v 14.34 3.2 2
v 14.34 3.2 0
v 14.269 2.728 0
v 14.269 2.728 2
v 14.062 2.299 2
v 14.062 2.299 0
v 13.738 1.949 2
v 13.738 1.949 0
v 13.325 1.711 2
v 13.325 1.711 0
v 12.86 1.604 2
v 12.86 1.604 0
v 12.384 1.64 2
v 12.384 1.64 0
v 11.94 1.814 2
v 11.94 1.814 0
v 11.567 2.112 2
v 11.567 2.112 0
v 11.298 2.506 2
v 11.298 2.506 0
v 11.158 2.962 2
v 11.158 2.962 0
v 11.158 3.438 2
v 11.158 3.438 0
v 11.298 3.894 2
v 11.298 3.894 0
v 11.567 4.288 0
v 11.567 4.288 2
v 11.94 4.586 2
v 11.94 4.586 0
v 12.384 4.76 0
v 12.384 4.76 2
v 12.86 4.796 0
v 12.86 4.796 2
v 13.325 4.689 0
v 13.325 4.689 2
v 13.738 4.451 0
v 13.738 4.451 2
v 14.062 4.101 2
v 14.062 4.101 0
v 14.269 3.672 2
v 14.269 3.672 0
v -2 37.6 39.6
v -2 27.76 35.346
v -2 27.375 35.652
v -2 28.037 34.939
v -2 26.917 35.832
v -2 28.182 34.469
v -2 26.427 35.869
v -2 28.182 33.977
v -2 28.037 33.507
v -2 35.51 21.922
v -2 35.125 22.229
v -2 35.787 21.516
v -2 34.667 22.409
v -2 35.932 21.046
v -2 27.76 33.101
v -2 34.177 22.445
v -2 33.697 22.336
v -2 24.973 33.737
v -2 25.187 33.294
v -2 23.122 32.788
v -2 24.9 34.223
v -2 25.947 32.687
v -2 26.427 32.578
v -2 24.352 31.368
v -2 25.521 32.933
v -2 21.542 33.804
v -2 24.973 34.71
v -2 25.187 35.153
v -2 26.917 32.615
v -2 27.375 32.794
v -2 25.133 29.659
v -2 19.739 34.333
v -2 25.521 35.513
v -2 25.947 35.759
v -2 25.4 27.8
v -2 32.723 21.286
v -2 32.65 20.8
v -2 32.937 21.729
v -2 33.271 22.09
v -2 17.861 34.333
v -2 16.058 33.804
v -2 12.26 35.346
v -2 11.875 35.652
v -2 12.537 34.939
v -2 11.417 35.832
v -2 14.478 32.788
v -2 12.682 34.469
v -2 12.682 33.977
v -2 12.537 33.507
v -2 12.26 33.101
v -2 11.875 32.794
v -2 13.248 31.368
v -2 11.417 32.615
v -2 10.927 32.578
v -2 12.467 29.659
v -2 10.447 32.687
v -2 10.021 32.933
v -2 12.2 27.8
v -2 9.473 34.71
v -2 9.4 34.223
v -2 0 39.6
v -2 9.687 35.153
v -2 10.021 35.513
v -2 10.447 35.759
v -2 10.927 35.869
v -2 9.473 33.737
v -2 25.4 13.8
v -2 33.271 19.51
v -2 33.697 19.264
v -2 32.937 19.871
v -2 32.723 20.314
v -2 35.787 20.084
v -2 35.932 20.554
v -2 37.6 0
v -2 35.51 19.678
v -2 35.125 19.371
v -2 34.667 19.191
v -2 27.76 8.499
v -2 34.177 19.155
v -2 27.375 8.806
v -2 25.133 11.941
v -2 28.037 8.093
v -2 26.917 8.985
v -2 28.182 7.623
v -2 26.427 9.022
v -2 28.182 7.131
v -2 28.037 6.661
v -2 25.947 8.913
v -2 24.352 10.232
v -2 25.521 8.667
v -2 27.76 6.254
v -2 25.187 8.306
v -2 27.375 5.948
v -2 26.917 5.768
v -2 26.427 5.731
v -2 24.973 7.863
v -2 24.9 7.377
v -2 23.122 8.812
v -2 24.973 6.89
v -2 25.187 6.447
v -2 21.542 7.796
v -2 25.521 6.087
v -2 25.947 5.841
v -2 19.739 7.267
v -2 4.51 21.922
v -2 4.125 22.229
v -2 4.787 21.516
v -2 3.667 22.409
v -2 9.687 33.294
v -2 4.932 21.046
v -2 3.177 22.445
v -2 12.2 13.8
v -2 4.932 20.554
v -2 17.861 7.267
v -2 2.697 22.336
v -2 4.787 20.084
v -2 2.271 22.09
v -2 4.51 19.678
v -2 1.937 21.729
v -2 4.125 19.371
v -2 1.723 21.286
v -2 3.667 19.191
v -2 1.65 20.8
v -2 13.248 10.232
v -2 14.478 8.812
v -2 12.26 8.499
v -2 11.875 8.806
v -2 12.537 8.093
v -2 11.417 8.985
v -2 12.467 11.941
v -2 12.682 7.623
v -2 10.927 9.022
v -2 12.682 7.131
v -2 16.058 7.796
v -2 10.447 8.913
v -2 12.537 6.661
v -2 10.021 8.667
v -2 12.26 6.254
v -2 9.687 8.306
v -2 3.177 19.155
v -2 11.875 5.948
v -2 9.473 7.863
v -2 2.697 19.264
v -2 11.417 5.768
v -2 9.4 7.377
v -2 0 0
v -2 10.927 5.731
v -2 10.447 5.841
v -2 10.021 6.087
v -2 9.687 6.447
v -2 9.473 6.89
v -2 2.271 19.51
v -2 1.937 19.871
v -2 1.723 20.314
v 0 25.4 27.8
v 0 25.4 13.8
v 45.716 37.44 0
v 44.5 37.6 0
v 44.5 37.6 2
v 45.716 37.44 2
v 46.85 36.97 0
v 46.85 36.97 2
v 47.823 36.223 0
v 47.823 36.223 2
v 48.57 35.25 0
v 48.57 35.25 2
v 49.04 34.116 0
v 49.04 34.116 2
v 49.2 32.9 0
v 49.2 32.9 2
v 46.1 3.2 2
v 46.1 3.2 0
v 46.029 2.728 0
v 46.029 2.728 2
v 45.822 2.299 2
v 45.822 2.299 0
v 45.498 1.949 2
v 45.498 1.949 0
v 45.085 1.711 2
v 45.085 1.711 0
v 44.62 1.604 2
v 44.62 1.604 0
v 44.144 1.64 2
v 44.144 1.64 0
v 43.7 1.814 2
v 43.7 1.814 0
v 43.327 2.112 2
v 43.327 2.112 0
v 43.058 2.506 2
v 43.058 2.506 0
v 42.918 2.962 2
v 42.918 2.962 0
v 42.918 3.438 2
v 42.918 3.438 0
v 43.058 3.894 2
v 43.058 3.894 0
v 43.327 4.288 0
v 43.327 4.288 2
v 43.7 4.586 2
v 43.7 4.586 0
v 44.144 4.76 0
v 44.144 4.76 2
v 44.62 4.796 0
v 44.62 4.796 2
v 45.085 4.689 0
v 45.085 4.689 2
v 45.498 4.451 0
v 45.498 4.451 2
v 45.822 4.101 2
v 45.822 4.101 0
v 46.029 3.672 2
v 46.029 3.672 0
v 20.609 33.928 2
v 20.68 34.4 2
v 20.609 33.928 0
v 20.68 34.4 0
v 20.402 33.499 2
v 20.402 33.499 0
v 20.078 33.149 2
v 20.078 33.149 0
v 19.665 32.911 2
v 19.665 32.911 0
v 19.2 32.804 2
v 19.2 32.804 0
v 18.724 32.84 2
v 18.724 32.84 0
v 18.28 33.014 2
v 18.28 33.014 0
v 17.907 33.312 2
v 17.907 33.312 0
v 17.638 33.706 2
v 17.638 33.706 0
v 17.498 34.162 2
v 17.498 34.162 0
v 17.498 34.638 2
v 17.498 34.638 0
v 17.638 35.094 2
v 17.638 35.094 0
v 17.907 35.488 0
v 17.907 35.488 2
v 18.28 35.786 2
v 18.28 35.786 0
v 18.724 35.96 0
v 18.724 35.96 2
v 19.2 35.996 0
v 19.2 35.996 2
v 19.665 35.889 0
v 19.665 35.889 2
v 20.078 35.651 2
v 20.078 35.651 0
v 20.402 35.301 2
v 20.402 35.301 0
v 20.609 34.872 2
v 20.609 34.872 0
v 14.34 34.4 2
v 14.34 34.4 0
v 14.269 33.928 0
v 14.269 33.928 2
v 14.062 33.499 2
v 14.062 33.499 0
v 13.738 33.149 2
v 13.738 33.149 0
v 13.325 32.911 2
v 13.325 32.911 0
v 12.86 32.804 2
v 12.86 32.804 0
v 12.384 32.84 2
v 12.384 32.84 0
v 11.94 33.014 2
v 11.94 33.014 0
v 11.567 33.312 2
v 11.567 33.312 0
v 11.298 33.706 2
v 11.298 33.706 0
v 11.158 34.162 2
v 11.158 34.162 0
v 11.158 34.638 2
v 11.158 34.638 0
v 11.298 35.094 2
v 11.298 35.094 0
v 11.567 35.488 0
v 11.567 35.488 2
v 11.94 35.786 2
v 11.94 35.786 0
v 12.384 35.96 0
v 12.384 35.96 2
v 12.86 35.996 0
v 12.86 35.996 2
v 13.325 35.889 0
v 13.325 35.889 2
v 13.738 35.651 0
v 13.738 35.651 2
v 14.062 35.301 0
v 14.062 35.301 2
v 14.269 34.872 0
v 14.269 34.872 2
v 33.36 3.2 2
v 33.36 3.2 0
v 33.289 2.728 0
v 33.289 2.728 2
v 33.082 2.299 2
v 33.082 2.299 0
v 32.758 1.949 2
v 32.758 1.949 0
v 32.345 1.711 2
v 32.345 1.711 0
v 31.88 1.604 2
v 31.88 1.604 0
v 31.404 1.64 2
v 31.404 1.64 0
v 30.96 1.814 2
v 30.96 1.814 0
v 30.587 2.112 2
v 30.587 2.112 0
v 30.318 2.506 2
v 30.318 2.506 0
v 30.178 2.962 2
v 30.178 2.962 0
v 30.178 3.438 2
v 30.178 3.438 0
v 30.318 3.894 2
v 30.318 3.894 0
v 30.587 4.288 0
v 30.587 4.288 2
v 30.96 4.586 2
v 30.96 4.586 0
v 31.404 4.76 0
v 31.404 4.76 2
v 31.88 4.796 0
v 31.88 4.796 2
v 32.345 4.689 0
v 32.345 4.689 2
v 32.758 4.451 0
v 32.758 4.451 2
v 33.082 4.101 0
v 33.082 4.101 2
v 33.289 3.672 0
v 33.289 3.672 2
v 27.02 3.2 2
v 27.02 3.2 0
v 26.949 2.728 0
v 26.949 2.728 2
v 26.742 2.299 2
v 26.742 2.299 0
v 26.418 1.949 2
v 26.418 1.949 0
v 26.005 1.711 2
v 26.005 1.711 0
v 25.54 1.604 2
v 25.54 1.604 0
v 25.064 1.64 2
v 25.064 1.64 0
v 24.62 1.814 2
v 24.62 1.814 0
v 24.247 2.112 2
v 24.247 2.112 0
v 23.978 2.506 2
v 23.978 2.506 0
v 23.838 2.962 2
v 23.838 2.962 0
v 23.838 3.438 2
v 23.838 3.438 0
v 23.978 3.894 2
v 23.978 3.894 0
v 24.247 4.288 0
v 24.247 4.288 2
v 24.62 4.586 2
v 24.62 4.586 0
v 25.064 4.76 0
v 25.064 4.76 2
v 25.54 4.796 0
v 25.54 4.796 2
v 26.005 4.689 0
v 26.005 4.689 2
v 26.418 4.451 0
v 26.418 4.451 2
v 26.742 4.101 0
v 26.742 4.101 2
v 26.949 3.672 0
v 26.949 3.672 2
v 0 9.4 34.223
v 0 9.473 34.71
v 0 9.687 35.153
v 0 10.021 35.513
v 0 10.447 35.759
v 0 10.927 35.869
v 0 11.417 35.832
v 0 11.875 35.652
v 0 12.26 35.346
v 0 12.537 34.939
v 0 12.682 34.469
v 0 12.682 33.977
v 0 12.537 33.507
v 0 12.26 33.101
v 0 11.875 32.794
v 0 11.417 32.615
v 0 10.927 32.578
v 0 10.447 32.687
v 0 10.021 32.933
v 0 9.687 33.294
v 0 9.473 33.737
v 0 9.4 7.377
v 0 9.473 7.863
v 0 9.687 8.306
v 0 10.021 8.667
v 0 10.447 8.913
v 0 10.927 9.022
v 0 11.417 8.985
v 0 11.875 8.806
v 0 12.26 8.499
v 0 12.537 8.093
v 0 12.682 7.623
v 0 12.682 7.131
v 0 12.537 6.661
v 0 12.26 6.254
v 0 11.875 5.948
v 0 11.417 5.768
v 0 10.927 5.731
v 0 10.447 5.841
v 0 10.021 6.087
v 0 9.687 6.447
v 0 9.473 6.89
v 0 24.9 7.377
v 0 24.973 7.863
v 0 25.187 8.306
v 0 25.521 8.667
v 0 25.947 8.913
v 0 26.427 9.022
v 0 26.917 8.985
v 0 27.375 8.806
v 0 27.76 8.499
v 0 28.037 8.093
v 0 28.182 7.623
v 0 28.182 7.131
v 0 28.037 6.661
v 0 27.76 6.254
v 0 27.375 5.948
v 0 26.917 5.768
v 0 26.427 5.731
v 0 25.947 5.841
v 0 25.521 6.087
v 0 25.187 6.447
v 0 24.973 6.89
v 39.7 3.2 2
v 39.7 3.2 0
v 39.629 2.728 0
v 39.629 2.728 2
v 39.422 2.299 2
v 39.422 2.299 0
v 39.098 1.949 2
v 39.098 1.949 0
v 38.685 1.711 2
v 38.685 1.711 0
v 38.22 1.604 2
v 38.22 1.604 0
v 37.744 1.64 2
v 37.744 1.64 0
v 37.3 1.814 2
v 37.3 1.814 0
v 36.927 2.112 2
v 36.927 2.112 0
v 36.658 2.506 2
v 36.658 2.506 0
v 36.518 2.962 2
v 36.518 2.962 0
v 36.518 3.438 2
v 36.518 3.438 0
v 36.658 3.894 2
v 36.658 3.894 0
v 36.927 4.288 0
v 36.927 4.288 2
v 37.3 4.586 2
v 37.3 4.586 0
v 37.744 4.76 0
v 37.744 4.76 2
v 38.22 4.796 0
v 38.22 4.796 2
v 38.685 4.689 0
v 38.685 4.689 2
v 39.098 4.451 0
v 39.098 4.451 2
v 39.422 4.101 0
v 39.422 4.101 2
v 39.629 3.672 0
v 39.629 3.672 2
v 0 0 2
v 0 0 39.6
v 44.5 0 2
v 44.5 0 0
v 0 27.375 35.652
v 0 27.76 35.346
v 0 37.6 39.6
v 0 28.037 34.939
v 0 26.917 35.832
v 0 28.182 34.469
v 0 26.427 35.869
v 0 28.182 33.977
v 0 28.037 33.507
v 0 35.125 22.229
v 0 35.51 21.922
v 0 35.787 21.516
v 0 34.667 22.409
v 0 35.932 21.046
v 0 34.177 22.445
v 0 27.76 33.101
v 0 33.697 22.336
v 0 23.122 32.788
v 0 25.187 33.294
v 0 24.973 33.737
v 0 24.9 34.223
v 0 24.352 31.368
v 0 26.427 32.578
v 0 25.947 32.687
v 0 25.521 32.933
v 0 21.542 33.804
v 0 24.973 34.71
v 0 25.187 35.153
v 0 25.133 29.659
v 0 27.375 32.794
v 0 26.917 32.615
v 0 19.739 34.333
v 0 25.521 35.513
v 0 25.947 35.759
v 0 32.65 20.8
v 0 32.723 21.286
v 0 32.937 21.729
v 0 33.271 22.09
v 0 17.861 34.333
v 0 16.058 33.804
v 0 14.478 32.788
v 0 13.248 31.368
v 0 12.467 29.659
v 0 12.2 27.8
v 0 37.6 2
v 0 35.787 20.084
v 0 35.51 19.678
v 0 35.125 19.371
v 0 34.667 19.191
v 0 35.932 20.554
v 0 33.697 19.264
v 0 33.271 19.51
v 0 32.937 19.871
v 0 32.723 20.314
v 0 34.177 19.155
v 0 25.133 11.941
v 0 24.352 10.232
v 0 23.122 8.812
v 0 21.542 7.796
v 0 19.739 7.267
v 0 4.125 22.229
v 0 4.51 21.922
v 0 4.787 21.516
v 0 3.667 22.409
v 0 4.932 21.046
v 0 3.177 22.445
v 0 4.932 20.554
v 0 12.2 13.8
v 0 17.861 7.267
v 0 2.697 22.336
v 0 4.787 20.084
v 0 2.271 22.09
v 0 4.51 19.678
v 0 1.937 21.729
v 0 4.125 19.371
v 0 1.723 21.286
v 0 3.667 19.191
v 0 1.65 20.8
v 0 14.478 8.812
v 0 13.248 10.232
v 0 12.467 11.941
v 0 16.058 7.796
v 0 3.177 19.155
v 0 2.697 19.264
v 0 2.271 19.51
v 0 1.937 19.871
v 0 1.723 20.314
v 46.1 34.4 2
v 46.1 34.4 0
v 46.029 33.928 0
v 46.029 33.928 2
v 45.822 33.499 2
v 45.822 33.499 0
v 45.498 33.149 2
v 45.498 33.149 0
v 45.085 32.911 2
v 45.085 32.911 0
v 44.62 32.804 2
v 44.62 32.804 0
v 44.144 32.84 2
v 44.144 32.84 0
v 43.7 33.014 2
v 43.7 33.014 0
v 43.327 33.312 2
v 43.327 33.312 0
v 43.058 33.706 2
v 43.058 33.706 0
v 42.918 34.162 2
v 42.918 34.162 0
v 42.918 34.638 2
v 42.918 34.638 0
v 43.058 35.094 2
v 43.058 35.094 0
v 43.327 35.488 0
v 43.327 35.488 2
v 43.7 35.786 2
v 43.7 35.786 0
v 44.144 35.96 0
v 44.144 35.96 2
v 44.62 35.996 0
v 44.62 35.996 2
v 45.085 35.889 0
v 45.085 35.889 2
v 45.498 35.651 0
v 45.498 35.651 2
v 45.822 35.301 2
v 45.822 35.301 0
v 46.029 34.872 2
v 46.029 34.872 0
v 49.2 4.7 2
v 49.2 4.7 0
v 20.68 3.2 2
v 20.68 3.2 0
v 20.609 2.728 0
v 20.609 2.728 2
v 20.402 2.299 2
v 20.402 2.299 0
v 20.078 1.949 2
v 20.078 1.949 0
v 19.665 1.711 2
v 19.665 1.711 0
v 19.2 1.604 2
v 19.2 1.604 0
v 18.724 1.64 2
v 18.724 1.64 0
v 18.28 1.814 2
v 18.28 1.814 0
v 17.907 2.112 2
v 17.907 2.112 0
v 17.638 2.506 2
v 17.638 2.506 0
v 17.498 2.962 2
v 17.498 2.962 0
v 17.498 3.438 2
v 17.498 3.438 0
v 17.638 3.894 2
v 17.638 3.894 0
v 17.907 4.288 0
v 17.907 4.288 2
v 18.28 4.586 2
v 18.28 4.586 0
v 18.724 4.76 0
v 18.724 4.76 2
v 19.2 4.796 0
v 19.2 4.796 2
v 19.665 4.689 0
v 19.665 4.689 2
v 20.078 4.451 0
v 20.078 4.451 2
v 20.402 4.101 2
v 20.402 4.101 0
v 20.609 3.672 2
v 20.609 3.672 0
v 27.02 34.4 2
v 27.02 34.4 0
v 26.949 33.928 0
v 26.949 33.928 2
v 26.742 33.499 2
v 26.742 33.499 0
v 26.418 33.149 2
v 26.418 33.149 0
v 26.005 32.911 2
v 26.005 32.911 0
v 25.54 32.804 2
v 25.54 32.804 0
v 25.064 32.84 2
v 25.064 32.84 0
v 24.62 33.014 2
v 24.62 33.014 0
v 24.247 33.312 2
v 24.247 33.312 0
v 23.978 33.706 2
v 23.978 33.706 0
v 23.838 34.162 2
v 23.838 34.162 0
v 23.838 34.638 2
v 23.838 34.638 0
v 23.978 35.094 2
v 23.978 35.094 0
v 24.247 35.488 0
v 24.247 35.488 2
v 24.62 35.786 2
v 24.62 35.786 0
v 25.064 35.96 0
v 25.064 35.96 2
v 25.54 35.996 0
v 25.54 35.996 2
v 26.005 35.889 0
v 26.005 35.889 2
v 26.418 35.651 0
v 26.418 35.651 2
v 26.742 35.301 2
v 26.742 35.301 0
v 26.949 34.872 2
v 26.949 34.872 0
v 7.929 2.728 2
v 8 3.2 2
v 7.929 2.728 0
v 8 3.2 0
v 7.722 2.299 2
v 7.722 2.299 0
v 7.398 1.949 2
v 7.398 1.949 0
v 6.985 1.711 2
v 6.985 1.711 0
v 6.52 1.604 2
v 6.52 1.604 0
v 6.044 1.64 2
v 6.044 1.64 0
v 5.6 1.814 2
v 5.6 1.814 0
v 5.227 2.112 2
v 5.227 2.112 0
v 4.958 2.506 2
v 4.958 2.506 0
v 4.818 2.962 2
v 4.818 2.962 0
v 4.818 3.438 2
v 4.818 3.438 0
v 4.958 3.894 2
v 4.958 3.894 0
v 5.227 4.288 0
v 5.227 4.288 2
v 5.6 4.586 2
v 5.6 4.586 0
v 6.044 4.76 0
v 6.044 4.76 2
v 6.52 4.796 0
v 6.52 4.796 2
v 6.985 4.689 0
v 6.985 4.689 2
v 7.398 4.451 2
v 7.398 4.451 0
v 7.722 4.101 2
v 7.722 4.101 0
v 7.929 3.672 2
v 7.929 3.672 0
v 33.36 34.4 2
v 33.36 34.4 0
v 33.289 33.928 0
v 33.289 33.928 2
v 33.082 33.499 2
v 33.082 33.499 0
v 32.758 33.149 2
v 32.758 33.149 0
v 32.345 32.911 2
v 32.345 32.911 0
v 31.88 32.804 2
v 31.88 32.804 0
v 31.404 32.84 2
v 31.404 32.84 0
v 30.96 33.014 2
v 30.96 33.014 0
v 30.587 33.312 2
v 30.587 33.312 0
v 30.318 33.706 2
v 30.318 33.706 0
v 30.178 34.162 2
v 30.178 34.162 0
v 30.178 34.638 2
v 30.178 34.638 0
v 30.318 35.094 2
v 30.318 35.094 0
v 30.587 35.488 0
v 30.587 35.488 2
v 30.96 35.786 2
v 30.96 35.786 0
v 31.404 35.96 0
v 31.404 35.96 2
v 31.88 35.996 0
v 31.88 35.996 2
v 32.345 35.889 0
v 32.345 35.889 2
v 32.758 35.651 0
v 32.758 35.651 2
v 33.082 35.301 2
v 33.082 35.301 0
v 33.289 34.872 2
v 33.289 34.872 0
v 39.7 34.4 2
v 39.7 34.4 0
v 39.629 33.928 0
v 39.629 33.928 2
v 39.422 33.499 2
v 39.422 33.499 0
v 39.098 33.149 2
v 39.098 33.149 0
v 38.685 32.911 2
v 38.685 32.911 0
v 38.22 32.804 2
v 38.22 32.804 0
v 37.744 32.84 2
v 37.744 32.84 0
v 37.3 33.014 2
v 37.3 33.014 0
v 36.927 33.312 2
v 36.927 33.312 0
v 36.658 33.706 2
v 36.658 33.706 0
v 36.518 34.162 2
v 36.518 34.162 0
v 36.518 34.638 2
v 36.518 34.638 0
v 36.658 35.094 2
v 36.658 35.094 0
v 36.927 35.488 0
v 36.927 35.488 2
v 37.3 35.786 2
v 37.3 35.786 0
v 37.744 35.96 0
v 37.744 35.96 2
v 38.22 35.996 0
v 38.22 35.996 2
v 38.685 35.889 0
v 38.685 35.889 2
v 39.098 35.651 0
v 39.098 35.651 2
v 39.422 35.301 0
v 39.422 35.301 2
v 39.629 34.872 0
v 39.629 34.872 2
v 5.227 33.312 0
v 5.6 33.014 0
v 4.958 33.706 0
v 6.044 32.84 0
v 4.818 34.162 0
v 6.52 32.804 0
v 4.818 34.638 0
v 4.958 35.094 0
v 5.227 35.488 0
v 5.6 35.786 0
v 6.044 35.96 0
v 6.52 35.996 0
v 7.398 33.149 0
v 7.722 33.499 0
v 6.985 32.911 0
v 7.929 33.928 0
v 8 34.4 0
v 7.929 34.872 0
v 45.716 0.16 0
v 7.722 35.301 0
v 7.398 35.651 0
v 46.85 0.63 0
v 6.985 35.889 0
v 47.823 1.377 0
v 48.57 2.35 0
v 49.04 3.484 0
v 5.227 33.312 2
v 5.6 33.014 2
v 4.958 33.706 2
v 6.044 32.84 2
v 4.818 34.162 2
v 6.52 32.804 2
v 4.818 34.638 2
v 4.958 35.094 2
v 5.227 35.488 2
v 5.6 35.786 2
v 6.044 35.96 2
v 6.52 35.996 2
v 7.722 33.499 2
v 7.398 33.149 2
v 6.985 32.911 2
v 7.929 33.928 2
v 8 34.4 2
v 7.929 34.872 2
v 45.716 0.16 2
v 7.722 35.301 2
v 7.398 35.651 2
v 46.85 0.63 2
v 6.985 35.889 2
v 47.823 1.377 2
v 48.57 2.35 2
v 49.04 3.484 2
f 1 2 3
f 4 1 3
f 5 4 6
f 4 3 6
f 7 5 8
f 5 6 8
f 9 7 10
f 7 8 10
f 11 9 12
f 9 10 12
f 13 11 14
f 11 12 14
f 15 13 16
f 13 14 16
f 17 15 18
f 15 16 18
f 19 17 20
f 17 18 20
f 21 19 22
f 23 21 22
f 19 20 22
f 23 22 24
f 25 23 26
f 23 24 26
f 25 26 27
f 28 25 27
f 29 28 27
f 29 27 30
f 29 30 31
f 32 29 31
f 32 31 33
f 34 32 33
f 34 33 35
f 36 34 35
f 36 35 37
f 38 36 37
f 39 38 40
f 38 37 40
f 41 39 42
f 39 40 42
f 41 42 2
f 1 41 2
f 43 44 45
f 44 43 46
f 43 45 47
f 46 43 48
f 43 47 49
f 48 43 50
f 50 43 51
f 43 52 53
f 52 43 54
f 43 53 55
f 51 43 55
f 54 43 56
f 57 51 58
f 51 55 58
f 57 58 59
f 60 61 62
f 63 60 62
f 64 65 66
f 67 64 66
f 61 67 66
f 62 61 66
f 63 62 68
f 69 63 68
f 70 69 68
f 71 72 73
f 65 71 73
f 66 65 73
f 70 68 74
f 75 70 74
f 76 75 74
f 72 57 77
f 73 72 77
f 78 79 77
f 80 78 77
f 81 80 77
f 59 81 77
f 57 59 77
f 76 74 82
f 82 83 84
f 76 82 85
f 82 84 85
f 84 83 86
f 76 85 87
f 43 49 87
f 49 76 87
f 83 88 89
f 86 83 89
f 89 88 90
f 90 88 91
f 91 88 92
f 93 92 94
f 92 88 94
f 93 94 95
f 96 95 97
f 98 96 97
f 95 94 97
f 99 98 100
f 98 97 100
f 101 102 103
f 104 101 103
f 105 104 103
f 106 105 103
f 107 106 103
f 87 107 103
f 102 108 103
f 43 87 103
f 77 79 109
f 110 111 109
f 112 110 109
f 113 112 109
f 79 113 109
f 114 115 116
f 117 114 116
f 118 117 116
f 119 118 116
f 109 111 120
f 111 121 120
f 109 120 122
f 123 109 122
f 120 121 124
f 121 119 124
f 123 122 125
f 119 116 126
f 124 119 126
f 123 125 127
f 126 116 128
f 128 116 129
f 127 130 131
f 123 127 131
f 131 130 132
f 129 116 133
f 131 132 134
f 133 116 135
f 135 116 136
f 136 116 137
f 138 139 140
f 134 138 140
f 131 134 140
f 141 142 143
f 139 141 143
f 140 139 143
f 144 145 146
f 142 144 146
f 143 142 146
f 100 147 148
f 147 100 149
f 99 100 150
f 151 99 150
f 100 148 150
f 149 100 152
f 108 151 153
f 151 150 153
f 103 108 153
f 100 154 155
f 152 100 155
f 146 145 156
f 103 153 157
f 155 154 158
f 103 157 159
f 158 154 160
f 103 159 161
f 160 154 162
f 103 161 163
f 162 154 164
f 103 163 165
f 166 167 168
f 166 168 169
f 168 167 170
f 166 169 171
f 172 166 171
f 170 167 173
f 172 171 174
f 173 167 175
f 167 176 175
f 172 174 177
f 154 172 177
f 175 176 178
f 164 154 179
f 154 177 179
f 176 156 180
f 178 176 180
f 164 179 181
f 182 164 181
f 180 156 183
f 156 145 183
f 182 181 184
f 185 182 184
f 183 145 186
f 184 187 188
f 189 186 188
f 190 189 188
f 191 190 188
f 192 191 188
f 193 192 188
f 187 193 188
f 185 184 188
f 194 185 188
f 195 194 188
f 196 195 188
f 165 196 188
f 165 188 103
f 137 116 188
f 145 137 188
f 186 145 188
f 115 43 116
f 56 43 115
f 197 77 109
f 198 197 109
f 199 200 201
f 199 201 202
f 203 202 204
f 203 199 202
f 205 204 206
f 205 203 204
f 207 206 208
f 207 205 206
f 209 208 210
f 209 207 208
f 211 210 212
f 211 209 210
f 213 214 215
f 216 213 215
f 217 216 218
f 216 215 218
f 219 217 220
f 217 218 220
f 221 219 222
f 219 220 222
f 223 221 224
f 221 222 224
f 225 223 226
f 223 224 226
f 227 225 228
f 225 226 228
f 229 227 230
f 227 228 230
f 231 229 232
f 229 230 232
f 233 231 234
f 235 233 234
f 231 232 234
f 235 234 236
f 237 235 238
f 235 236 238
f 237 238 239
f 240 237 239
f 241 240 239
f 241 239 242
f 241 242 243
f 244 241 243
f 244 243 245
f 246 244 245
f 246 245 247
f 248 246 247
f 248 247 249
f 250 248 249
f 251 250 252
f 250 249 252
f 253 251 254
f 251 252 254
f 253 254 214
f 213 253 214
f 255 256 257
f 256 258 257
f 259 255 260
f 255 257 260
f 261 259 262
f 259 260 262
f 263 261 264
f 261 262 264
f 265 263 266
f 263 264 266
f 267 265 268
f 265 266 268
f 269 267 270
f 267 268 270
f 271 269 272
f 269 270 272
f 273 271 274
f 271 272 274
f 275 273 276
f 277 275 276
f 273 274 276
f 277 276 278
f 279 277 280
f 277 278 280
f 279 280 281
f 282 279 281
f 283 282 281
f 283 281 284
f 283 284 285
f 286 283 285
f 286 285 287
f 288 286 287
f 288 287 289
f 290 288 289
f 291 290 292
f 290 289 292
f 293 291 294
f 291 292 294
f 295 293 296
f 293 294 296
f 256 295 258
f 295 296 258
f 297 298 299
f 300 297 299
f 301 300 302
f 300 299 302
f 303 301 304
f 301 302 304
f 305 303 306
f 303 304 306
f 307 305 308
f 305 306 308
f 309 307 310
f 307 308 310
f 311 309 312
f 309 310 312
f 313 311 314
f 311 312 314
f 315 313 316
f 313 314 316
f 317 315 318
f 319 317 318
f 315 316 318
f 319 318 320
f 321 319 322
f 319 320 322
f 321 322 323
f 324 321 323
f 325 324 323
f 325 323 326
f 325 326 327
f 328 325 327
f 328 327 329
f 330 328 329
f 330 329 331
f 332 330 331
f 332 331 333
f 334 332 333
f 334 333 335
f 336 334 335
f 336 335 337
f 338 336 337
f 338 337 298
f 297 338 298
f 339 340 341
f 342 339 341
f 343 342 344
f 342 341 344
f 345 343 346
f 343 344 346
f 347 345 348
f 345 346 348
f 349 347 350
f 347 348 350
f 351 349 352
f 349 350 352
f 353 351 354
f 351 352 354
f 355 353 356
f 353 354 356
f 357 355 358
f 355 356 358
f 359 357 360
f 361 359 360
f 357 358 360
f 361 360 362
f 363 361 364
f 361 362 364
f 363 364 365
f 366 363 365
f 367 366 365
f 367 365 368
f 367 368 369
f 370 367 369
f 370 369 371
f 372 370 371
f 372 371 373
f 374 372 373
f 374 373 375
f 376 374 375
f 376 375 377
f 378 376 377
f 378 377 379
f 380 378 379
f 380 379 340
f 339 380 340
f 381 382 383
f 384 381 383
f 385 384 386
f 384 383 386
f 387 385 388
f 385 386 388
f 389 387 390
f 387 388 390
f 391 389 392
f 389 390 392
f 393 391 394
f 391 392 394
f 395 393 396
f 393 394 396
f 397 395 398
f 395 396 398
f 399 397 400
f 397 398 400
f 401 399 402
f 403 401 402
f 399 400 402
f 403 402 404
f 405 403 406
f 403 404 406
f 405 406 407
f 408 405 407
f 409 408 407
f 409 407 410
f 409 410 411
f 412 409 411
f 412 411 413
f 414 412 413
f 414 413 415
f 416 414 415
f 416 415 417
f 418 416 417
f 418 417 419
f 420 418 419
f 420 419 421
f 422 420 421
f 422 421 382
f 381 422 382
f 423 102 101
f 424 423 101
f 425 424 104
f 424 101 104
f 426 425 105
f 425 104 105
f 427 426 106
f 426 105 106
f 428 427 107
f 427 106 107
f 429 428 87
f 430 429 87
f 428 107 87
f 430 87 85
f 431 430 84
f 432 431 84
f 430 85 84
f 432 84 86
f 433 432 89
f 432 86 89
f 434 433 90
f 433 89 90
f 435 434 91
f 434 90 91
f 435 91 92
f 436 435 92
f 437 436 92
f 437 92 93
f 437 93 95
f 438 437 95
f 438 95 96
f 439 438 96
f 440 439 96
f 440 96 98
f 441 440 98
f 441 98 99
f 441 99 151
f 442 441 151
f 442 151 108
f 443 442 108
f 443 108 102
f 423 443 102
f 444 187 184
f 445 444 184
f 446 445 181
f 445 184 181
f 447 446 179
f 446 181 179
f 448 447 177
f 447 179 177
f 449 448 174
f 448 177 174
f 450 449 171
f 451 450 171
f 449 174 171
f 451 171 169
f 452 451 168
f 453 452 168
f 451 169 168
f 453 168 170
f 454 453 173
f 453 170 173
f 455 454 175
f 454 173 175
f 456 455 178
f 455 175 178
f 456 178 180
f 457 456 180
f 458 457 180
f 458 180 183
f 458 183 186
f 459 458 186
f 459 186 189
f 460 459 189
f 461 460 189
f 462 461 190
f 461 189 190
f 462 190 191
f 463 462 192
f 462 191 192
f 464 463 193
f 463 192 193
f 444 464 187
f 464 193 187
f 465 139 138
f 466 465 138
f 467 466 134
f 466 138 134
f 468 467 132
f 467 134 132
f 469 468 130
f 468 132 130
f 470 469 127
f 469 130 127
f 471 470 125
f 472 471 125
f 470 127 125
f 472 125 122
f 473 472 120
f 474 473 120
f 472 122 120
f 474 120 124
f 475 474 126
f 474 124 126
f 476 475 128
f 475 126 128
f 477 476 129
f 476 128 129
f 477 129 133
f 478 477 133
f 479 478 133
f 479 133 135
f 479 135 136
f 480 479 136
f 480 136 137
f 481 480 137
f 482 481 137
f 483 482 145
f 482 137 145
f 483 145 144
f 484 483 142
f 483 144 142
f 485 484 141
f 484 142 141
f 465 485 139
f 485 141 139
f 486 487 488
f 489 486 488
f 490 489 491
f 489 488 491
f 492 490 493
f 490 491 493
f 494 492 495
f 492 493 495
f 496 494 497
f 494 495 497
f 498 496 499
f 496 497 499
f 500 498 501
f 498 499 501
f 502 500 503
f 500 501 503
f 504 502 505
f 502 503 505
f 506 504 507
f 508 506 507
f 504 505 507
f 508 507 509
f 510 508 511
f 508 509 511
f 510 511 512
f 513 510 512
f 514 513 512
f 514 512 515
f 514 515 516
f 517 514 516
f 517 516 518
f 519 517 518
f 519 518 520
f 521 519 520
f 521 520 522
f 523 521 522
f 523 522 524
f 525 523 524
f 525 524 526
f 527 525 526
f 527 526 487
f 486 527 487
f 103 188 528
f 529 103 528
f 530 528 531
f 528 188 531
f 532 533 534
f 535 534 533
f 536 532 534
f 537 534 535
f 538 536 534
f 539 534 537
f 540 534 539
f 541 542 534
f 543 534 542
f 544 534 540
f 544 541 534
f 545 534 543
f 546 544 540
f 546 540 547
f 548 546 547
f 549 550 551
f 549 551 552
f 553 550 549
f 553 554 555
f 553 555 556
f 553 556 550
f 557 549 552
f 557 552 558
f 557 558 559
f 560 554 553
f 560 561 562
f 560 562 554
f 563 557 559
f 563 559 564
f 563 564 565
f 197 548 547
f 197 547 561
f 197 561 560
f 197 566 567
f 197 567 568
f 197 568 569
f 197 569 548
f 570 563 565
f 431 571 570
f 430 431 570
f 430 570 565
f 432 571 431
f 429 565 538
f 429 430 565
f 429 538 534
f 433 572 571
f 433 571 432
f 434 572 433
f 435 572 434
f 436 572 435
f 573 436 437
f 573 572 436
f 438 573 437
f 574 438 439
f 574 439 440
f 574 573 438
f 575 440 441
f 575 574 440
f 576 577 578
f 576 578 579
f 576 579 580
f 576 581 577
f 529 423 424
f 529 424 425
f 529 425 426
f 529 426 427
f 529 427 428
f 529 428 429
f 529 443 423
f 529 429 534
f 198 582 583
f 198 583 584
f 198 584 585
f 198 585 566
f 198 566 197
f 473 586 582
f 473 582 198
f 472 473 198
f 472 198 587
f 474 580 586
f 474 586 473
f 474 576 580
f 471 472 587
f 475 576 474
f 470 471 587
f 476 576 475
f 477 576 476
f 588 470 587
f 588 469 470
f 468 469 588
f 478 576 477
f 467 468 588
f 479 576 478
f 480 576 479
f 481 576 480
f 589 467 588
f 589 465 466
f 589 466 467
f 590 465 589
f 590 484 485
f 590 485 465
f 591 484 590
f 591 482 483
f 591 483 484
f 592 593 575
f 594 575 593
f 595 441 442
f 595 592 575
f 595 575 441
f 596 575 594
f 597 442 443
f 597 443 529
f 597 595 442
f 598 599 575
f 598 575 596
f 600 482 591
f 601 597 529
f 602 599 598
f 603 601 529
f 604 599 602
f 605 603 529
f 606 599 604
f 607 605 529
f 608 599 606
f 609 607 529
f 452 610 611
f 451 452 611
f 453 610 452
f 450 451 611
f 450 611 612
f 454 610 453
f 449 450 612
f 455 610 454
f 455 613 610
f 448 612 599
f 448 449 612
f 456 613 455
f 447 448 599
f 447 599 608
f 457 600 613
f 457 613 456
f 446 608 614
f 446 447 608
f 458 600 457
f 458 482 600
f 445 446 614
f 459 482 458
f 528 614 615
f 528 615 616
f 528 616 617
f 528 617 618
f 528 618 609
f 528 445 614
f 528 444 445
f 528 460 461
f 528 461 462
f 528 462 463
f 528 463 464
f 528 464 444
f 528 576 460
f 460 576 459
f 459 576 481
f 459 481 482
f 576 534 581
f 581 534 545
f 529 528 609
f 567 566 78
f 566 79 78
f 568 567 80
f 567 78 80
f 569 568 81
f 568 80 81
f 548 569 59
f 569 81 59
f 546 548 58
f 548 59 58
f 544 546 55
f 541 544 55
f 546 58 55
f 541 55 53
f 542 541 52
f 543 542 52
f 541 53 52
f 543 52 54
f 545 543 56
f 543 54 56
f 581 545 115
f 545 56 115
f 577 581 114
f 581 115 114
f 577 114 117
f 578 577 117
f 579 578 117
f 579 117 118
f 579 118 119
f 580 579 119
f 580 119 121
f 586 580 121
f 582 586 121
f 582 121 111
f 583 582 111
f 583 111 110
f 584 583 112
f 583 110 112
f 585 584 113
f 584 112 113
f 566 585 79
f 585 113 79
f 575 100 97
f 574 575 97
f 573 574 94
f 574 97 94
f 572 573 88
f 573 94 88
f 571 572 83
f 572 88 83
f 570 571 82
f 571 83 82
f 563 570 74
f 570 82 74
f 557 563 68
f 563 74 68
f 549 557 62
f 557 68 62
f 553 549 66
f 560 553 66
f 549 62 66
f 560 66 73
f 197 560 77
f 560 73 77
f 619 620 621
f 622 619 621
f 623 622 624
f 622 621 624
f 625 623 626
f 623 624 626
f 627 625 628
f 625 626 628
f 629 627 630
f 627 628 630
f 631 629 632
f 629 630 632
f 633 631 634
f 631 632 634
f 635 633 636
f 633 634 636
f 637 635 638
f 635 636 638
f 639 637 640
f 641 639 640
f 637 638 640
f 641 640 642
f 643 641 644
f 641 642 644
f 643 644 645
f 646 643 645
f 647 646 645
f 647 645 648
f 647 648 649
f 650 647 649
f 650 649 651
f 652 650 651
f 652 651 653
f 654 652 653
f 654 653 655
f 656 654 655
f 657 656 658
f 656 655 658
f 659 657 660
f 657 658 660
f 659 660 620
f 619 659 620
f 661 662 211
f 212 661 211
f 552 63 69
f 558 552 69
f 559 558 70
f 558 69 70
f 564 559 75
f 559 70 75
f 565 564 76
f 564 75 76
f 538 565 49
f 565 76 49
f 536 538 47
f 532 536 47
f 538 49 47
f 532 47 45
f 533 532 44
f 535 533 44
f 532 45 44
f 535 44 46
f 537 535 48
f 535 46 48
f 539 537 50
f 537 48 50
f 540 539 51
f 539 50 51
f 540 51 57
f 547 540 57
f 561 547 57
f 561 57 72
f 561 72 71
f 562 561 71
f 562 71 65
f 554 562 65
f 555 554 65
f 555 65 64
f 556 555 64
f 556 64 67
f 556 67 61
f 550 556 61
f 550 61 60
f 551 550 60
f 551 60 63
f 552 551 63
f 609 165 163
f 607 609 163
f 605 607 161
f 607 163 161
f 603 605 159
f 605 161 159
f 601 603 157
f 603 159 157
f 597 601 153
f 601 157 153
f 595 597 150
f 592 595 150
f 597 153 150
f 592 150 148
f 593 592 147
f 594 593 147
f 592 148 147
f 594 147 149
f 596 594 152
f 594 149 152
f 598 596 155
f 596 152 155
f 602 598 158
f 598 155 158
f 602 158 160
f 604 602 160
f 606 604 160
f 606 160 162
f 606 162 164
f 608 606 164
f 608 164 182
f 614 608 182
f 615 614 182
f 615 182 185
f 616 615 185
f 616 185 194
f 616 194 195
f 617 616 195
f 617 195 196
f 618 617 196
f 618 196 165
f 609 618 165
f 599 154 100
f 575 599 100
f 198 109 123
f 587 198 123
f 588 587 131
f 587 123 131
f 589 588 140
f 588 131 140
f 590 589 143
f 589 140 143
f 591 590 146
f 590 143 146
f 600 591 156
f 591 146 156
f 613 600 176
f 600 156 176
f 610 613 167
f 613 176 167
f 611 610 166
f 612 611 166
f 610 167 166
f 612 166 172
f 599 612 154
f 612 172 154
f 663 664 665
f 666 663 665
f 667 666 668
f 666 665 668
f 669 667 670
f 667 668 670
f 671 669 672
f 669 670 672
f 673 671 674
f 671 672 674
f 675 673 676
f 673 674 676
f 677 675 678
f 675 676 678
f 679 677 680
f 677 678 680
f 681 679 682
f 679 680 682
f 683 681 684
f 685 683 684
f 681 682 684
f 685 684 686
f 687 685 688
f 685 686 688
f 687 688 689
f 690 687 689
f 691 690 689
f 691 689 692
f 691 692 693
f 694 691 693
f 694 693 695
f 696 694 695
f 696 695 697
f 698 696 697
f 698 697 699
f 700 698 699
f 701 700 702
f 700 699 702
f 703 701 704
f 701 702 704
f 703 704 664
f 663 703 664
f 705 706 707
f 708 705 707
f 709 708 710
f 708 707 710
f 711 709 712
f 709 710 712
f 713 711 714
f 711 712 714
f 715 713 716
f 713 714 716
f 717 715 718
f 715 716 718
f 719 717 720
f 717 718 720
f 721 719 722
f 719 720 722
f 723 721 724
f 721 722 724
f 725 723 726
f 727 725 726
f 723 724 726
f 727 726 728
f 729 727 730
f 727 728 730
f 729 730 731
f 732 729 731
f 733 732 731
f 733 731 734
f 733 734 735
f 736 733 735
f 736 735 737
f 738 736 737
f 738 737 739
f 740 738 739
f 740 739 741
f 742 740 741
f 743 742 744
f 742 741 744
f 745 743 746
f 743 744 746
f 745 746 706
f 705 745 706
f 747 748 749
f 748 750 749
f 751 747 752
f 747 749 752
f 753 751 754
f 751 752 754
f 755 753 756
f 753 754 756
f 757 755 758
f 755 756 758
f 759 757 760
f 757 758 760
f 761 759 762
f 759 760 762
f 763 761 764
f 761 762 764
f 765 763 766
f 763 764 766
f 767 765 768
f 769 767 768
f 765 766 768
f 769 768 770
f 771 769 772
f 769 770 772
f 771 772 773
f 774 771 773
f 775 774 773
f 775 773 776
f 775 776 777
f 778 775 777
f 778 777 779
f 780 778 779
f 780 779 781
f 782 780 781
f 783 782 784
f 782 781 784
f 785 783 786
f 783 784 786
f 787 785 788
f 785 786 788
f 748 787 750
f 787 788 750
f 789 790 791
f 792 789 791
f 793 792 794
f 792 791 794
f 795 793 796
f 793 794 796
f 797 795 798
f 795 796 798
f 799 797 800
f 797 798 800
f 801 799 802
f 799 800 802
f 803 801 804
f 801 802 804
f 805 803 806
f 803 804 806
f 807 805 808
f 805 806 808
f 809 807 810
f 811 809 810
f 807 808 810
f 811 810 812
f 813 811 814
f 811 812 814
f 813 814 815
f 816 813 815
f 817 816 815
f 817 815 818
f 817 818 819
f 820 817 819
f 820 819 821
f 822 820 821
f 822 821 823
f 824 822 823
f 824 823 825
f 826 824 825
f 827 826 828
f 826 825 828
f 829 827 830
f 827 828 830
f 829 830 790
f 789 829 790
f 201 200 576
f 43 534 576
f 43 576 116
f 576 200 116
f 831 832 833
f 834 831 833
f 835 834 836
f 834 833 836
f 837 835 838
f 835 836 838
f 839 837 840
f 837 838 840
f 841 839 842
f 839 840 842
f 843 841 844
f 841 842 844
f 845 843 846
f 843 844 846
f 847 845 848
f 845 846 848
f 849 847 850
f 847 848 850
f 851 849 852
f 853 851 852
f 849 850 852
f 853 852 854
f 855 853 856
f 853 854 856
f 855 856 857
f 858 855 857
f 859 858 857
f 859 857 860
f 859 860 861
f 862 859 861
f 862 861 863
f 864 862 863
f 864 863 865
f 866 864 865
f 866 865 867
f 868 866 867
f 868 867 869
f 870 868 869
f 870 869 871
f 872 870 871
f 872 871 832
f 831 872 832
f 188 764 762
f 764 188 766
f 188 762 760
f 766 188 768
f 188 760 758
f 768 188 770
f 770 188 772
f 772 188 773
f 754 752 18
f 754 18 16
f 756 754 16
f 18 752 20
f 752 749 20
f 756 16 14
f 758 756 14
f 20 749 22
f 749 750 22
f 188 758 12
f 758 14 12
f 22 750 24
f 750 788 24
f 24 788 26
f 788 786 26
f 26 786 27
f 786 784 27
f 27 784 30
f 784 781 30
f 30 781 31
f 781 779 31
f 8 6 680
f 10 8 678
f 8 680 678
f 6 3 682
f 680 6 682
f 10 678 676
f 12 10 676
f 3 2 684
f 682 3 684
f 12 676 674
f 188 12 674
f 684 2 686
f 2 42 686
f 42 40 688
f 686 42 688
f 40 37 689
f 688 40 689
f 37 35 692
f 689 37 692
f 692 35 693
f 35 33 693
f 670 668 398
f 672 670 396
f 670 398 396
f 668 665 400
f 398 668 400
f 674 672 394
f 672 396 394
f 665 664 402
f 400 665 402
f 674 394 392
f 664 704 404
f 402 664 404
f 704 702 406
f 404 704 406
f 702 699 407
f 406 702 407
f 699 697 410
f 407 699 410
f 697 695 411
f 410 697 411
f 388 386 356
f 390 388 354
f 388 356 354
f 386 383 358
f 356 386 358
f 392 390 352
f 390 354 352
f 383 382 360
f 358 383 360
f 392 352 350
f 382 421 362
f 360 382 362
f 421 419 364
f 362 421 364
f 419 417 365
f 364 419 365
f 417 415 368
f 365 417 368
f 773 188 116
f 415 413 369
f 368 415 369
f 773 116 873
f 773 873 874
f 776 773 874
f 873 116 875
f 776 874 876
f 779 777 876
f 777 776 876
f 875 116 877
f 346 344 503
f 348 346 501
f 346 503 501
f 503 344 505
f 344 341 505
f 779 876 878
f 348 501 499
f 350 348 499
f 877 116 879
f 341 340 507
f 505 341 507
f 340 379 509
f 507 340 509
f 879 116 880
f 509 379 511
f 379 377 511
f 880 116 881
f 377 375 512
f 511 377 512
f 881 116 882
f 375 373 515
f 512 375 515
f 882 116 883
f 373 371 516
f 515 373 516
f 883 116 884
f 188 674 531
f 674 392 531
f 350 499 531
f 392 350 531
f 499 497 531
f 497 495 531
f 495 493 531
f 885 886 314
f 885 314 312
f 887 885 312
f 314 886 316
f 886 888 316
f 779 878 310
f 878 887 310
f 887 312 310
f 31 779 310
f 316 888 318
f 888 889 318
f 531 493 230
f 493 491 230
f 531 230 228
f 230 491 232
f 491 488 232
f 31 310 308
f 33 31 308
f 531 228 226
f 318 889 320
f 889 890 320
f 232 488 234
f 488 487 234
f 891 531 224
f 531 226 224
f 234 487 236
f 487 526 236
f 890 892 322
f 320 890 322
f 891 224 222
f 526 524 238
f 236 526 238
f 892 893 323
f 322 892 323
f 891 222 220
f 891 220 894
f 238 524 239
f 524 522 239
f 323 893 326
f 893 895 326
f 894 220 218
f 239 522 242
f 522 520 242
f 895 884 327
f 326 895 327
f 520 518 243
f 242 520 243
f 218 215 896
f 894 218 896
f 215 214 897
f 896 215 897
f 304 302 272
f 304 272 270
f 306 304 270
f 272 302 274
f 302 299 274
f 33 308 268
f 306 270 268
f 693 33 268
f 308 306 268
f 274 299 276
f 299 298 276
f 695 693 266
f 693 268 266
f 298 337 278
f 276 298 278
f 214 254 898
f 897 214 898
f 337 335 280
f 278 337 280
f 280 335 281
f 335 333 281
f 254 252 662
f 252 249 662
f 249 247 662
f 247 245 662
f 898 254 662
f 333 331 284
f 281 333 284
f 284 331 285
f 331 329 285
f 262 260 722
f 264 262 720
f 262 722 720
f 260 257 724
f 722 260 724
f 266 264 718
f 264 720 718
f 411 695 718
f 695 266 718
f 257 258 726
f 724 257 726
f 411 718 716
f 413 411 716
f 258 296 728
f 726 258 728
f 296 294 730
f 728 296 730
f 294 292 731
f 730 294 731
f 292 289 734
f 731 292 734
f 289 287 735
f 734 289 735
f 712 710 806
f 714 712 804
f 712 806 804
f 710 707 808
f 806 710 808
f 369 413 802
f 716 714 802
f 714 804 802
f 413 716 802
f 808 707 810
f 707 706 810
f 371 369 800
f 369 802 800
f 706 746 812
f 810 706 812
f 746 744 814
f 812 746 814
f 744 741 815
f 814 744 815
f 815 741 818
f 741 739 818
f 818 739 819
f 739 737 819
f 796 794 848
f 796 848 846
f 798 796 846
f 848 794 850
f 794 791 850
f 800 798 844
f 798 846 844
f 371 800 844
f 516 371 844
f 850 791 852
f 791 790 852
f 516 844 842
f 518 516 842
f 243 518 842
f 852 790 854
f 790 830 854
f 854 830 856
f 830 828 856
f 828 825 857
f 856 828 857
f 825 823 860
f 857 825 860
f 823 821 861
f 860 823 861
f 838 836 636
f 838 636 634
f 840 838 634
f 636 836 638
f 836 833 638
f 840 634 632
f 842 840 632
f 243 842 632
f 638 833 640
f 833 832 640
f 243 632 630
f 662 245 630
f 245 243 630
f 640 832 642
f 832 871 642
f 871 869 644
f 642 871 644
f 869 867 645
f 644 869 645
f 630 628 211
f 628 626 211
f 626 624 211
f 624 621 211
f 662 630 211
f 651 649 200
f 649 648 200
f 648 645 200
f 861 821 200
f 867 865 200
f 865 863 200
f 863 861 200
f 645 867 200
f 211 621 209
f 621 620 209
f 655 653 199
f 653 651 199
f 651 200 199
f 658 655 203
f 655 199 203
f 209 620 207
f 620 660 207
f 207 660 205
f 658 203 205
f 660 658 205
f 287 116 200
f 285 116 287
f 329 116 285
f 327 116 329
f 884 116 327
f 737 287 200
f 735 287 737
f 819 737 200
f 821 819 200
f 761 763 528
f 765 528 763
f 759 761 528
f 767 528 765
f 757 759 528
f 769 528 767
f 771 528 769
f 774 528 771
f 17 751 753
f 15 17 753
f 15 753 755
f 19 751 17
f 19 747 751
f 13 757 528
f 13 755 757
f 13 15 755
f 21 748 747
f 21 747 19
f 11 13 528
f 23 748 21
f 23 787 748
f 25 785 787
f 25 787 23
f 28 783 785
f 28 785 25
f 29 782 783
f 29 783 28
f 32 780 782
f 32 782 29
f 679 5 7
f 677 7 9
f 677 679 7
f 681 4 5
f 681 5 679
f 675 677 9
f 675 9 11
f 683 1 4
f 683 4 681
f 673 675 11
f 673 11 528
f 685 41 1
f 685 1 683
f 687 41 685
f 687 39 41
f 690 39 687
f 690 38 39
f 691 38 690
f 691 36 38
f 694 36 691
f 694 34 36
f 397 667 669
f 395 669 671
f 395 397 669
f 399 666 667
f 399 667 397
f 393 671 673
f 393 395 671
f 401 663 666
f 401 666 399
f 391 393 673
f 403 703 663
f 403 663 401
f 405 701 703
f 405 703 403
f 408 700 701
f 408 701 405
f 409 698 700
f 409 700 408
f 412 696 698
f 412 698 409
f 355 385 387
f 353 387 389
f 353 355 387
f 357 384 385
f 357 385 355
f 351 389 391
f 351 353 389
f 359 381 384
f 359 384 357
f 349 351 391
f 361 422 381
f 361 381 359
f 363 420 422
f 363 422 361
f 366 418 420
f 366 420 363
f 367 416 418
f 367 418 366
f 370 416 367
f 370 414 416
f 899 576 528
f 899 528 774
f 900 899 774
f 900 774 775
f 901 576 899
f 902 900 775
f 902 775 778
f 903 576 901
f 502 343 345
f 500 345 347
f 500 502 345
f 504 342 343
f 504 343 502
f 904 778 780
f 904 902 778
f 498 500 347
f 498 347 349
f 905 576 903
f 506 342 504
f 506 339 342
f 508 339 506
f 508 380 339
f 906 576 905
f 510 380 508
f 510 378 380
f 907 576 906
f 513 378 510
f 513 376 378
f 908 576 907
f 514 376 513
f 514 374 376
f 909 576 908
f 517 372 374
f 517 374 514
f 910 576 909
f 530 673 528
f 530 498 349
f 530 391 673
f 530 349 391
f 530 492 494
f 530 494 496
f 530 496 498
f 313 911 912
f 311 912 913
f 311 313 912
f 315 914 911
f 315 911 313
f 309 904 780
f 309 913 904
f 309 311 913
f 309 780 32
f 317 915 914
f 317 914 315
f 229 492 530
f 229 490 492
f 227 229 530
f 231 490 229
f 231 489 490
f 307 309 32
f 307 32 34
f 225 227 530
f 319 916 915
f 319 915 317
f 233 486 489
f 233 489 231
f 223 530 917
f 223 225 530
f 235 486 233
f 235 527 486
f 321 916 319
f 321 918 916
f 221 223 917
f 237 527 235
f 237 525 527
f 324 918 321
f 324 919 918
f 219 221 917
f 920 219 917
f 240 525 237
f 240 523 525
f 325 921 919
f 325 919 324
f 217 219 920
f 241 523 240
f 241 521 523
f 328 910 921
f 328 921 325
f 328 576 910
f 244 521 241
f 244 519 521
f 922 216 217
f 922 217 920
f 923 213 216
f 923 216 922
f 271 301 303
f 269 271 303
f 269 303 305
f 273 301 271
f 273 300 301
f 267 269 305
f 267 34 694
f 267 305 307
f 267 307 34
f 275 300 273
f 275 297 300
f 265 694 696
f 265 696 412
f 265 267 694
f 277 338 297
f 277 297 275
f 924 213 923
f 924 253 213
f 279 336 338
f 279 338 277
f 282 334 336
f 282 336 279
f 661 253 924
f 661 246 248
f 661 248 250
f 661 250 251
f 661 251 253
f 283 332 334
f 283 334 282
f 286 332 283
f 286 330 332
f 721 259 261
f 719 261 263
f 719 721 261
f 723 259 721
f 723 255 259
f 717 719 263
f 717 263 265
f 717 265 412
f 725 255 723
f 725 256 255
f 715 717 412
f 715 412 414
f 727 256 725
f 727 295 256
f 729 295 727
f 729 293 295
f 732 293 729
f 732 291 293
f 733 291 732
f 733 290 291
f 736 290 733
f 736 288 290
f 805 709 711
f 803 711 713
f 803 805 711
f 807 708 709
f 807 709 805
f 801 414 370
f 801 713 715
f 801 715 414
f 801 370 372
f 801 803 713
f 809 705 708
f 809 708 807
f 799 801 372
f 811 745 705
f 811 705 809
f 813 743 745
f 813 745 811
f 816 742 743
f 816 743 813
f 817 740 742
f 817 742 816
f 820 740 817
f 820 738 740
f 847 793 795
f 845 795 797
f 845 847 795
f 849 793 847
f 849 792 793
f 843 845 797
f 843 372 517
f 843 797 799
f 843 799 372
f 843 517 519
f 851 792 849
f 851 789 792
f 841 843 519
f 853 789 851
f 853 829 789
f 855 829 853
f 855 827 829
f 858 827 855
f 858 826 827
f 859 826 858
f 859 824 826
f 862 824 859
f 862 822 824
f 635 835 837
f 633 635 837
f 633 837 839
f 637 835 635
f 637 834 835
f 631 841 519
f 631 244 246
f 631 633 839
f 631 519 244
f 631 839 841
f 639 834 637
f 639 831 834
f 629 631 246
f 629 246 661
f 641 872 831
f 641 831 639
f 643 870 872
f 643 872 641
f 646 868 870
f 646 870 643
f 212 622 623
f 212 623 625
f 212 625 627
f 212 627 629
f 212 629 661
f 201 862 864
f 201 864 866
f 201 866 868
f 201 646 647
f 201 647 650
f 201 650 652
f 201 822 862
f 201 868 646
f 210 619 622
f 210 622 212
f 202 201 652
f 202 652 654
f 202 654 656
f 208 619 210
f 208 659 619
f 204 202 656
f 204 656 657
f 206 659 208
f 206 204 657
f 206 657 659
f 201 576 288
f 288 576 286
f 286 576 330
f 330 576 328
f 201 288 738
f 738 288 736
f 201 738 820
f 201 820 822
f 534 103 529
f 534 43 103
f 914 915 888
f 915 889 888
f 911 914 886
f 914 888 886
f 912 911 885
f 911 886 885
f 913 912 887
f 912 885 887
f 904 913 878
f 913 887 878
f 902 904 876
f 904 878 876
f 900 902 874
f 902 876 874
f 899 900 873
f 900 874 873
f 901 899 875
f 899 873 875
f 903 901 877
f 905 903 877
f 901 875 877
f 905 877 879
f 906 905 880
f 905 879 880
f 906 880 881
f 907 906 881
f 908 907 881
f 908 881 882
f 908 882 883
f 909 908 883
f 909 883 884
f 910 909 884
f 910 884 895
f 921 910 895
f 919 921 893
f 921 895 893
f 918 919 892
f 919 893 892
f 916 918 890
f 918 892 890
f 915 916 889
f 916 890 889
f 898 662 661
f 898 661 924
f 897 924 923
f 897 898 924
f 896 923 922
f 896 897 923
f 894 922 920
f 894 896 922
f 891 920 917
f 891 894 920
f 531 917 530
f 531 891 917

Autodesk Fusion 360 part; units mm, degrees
sketch "Esquisse1" plane through (0, 0, 0) normal (0, 0, 1) x (1, 0, 0)
  line L0 (0, 0) -> (44.5, 0)
  line L1 (49.2, 4.7) -> (49.2, 32.9)
  line L2 (44.5, 37.6) -> (0, 37.6)
  line L3 (0, 37.6) -> (0, 0)
  line L4 (0, 37.6) -> (-2, 37.6)
  line L5 (-2, 37.6) -> (-2, 0)
  line L6 (-2, 0) -> (0, 0)
  line L7 (0, 0) -> (0, 37.6)
  circle A0 centre (6.4, 34.4) radius 1.6
  circle A1 centre (6.4, 3.2) radius 1.6
  circle A2 centre (38.1, 34.4) radius 1.6
  circle A3 centre (44.5, 34.4) radius 1.6
  circle A4 centre (38.1, 3.2) radius 1.6
  circle A5 centre (44.5, 3.2) radius 1.6
  arc A6 (49.2, 32.9) -> (44.5, 37.6) centre (44.5, 32.9) ccw
  arc A7 (44.5, 0) -> (49.2, 4.7) centre (44.5, 4.7) ccw
  circle A8 centre (12.74, 3.2) radius 1.6
  circle A9 centre (19.08, 3.2) radius 1.6
  circle A10 centre (25.42, 3.2) radius 1.6
  circle A11 centre (31.76, 3.2) radius 1.6
  circle A12 centre (12.74, 34.4) radius 1.6
  circle A13 centre (19.08, 34.4) radius 1.6
  circle A14 centre (25.42, 34.4) radius 1.6
  circle A15 centre (31.76, 34.4) radius 1.6
  point P0 (49.2, 0)
  dimension "d1" = 49.2
  dimension "d2" = 37.6
  dimension "d3" = 2
  dimension "d6" = 3.2
  dimension "d7" = 8.4
  dimension "d8" = 3.2
  dimension "d10" = 3.2
  dimension "d11" = 3.2
  dimension "d12" = 8.4
  dimension "d19" = 3.2
  dimension "d20" = 3.2
  dimension "d25" = 3.2
  dimension "d26" = 3.2
  dimension "d27" = 4.7
  dimension "d28" = 4.7
  dimension "d29" = 6.4
  dimension "d30" = 6.4
  dimension "d31" = 4.7
  dimension "d32" = 4.7
  dimension "d48" = 3.2
  dimension "d49" = 3.2
  dimension "d50" = 3.2
  dimension "d51" = 3.2
  dimension "d52" = 3.2
  dimension "d53" = 3.2
  dimension "d54" = 3.2
  dimension "d55" = 3.2
extrude "Extrusion1" add sketch "Esquisse1" along normal blind 2 contours L0 L1 L2 L3 L7 A6 A7 | L3 L4 L5 L6 L7 | A0 | A1 | A2 | A3 | A4 | A5 | A8 | A9 | A10 | A11 | A12 | A13 | A14 | A15 makes body 1
extrude "Extrusion3" add sketch "Esquisse1" along normal blind 39.6 contours L3 L4 L5 L6 L7 bodies 1
sketch "Esquisse2" plane through (-2, 0, 0) normal (-1, 0, 0) x (0, -1, 0)
  line L0 (-37.6, 0) -> (0, 0)
  line L1 (0, 0) -> (0, 39.6)
  line L2 (0, 39.6) -> (-37.6, 39.6)
  line L3 (-37.6, 39.6) -> (-37.6, 0)
  circle A0 centre (-3.3, 20.8) radius 1.65
  circle A1 centre (-11.05, 34.2234) radius 1.65
  circle A2 centre (-26.55, 34.2234) radius 1.65
  circle A3 centre (-34.3, 20.8) radius 1.65
  circle A4 centre (-26.55, 7.3766) radius 1.65
  circle A5 centre (-11.05, 7.3766) radius 1.65
  line L4 (-25.4, 27.8) -> (-25.4, 13.8)
  line L5 (-12.2, 13.8) -> (-12.2, 27.8)
  line L6 (-12.2, 27.8) -> (-25.4, 13.8) construction
  line L7 (-25.4, 27.8) -> (-12.2, 13.8) construction
  arc A6 (-12.2, 27.8) -> (-25.4, 27.8) centre (-18.8, 27.8) ccw
  arc A7 (-25.4, 13.8) -> (-12.2, 13.8) centre (-18.8, 13.8) ccw
  arc A8 (-18.8, 39.6) -> (-37.6, 20.8) centre (-18.8, 20.8) ccw
  arc A9 (0, 20.8) -> (-18.8, 39.6) centre (-18.8, 20.8) ccw
  point P0 (-18.8, 20.8)
  dimension "d39" = 3.3
  dimension "d42" = 13.2
  dimension "d43" = 14
extrude "Extrusion4" cut sketch "Esquisse2" against normal blind 19 contours A0 | A1 | A2 | A3 | A4 | A5 | L4 L5 A6 A7 bodies 1
extrude "Extrusion5" cut sketch "Esquisse1" along normal blind 8 contours A0 | A1 | A2 | A3 | A4 | A5 | A8 | A9 | A10 | A11 | A12 | A13 | A14 | A15 bodies 1
copy_body "Corps->Comp3" bodies 1 removing the originals makes body 2 in component "Component"
component "Component" placed x (1, 0, 0) y (0, 1, 0) z (0, 0, 1) at (0, 0, 0)
